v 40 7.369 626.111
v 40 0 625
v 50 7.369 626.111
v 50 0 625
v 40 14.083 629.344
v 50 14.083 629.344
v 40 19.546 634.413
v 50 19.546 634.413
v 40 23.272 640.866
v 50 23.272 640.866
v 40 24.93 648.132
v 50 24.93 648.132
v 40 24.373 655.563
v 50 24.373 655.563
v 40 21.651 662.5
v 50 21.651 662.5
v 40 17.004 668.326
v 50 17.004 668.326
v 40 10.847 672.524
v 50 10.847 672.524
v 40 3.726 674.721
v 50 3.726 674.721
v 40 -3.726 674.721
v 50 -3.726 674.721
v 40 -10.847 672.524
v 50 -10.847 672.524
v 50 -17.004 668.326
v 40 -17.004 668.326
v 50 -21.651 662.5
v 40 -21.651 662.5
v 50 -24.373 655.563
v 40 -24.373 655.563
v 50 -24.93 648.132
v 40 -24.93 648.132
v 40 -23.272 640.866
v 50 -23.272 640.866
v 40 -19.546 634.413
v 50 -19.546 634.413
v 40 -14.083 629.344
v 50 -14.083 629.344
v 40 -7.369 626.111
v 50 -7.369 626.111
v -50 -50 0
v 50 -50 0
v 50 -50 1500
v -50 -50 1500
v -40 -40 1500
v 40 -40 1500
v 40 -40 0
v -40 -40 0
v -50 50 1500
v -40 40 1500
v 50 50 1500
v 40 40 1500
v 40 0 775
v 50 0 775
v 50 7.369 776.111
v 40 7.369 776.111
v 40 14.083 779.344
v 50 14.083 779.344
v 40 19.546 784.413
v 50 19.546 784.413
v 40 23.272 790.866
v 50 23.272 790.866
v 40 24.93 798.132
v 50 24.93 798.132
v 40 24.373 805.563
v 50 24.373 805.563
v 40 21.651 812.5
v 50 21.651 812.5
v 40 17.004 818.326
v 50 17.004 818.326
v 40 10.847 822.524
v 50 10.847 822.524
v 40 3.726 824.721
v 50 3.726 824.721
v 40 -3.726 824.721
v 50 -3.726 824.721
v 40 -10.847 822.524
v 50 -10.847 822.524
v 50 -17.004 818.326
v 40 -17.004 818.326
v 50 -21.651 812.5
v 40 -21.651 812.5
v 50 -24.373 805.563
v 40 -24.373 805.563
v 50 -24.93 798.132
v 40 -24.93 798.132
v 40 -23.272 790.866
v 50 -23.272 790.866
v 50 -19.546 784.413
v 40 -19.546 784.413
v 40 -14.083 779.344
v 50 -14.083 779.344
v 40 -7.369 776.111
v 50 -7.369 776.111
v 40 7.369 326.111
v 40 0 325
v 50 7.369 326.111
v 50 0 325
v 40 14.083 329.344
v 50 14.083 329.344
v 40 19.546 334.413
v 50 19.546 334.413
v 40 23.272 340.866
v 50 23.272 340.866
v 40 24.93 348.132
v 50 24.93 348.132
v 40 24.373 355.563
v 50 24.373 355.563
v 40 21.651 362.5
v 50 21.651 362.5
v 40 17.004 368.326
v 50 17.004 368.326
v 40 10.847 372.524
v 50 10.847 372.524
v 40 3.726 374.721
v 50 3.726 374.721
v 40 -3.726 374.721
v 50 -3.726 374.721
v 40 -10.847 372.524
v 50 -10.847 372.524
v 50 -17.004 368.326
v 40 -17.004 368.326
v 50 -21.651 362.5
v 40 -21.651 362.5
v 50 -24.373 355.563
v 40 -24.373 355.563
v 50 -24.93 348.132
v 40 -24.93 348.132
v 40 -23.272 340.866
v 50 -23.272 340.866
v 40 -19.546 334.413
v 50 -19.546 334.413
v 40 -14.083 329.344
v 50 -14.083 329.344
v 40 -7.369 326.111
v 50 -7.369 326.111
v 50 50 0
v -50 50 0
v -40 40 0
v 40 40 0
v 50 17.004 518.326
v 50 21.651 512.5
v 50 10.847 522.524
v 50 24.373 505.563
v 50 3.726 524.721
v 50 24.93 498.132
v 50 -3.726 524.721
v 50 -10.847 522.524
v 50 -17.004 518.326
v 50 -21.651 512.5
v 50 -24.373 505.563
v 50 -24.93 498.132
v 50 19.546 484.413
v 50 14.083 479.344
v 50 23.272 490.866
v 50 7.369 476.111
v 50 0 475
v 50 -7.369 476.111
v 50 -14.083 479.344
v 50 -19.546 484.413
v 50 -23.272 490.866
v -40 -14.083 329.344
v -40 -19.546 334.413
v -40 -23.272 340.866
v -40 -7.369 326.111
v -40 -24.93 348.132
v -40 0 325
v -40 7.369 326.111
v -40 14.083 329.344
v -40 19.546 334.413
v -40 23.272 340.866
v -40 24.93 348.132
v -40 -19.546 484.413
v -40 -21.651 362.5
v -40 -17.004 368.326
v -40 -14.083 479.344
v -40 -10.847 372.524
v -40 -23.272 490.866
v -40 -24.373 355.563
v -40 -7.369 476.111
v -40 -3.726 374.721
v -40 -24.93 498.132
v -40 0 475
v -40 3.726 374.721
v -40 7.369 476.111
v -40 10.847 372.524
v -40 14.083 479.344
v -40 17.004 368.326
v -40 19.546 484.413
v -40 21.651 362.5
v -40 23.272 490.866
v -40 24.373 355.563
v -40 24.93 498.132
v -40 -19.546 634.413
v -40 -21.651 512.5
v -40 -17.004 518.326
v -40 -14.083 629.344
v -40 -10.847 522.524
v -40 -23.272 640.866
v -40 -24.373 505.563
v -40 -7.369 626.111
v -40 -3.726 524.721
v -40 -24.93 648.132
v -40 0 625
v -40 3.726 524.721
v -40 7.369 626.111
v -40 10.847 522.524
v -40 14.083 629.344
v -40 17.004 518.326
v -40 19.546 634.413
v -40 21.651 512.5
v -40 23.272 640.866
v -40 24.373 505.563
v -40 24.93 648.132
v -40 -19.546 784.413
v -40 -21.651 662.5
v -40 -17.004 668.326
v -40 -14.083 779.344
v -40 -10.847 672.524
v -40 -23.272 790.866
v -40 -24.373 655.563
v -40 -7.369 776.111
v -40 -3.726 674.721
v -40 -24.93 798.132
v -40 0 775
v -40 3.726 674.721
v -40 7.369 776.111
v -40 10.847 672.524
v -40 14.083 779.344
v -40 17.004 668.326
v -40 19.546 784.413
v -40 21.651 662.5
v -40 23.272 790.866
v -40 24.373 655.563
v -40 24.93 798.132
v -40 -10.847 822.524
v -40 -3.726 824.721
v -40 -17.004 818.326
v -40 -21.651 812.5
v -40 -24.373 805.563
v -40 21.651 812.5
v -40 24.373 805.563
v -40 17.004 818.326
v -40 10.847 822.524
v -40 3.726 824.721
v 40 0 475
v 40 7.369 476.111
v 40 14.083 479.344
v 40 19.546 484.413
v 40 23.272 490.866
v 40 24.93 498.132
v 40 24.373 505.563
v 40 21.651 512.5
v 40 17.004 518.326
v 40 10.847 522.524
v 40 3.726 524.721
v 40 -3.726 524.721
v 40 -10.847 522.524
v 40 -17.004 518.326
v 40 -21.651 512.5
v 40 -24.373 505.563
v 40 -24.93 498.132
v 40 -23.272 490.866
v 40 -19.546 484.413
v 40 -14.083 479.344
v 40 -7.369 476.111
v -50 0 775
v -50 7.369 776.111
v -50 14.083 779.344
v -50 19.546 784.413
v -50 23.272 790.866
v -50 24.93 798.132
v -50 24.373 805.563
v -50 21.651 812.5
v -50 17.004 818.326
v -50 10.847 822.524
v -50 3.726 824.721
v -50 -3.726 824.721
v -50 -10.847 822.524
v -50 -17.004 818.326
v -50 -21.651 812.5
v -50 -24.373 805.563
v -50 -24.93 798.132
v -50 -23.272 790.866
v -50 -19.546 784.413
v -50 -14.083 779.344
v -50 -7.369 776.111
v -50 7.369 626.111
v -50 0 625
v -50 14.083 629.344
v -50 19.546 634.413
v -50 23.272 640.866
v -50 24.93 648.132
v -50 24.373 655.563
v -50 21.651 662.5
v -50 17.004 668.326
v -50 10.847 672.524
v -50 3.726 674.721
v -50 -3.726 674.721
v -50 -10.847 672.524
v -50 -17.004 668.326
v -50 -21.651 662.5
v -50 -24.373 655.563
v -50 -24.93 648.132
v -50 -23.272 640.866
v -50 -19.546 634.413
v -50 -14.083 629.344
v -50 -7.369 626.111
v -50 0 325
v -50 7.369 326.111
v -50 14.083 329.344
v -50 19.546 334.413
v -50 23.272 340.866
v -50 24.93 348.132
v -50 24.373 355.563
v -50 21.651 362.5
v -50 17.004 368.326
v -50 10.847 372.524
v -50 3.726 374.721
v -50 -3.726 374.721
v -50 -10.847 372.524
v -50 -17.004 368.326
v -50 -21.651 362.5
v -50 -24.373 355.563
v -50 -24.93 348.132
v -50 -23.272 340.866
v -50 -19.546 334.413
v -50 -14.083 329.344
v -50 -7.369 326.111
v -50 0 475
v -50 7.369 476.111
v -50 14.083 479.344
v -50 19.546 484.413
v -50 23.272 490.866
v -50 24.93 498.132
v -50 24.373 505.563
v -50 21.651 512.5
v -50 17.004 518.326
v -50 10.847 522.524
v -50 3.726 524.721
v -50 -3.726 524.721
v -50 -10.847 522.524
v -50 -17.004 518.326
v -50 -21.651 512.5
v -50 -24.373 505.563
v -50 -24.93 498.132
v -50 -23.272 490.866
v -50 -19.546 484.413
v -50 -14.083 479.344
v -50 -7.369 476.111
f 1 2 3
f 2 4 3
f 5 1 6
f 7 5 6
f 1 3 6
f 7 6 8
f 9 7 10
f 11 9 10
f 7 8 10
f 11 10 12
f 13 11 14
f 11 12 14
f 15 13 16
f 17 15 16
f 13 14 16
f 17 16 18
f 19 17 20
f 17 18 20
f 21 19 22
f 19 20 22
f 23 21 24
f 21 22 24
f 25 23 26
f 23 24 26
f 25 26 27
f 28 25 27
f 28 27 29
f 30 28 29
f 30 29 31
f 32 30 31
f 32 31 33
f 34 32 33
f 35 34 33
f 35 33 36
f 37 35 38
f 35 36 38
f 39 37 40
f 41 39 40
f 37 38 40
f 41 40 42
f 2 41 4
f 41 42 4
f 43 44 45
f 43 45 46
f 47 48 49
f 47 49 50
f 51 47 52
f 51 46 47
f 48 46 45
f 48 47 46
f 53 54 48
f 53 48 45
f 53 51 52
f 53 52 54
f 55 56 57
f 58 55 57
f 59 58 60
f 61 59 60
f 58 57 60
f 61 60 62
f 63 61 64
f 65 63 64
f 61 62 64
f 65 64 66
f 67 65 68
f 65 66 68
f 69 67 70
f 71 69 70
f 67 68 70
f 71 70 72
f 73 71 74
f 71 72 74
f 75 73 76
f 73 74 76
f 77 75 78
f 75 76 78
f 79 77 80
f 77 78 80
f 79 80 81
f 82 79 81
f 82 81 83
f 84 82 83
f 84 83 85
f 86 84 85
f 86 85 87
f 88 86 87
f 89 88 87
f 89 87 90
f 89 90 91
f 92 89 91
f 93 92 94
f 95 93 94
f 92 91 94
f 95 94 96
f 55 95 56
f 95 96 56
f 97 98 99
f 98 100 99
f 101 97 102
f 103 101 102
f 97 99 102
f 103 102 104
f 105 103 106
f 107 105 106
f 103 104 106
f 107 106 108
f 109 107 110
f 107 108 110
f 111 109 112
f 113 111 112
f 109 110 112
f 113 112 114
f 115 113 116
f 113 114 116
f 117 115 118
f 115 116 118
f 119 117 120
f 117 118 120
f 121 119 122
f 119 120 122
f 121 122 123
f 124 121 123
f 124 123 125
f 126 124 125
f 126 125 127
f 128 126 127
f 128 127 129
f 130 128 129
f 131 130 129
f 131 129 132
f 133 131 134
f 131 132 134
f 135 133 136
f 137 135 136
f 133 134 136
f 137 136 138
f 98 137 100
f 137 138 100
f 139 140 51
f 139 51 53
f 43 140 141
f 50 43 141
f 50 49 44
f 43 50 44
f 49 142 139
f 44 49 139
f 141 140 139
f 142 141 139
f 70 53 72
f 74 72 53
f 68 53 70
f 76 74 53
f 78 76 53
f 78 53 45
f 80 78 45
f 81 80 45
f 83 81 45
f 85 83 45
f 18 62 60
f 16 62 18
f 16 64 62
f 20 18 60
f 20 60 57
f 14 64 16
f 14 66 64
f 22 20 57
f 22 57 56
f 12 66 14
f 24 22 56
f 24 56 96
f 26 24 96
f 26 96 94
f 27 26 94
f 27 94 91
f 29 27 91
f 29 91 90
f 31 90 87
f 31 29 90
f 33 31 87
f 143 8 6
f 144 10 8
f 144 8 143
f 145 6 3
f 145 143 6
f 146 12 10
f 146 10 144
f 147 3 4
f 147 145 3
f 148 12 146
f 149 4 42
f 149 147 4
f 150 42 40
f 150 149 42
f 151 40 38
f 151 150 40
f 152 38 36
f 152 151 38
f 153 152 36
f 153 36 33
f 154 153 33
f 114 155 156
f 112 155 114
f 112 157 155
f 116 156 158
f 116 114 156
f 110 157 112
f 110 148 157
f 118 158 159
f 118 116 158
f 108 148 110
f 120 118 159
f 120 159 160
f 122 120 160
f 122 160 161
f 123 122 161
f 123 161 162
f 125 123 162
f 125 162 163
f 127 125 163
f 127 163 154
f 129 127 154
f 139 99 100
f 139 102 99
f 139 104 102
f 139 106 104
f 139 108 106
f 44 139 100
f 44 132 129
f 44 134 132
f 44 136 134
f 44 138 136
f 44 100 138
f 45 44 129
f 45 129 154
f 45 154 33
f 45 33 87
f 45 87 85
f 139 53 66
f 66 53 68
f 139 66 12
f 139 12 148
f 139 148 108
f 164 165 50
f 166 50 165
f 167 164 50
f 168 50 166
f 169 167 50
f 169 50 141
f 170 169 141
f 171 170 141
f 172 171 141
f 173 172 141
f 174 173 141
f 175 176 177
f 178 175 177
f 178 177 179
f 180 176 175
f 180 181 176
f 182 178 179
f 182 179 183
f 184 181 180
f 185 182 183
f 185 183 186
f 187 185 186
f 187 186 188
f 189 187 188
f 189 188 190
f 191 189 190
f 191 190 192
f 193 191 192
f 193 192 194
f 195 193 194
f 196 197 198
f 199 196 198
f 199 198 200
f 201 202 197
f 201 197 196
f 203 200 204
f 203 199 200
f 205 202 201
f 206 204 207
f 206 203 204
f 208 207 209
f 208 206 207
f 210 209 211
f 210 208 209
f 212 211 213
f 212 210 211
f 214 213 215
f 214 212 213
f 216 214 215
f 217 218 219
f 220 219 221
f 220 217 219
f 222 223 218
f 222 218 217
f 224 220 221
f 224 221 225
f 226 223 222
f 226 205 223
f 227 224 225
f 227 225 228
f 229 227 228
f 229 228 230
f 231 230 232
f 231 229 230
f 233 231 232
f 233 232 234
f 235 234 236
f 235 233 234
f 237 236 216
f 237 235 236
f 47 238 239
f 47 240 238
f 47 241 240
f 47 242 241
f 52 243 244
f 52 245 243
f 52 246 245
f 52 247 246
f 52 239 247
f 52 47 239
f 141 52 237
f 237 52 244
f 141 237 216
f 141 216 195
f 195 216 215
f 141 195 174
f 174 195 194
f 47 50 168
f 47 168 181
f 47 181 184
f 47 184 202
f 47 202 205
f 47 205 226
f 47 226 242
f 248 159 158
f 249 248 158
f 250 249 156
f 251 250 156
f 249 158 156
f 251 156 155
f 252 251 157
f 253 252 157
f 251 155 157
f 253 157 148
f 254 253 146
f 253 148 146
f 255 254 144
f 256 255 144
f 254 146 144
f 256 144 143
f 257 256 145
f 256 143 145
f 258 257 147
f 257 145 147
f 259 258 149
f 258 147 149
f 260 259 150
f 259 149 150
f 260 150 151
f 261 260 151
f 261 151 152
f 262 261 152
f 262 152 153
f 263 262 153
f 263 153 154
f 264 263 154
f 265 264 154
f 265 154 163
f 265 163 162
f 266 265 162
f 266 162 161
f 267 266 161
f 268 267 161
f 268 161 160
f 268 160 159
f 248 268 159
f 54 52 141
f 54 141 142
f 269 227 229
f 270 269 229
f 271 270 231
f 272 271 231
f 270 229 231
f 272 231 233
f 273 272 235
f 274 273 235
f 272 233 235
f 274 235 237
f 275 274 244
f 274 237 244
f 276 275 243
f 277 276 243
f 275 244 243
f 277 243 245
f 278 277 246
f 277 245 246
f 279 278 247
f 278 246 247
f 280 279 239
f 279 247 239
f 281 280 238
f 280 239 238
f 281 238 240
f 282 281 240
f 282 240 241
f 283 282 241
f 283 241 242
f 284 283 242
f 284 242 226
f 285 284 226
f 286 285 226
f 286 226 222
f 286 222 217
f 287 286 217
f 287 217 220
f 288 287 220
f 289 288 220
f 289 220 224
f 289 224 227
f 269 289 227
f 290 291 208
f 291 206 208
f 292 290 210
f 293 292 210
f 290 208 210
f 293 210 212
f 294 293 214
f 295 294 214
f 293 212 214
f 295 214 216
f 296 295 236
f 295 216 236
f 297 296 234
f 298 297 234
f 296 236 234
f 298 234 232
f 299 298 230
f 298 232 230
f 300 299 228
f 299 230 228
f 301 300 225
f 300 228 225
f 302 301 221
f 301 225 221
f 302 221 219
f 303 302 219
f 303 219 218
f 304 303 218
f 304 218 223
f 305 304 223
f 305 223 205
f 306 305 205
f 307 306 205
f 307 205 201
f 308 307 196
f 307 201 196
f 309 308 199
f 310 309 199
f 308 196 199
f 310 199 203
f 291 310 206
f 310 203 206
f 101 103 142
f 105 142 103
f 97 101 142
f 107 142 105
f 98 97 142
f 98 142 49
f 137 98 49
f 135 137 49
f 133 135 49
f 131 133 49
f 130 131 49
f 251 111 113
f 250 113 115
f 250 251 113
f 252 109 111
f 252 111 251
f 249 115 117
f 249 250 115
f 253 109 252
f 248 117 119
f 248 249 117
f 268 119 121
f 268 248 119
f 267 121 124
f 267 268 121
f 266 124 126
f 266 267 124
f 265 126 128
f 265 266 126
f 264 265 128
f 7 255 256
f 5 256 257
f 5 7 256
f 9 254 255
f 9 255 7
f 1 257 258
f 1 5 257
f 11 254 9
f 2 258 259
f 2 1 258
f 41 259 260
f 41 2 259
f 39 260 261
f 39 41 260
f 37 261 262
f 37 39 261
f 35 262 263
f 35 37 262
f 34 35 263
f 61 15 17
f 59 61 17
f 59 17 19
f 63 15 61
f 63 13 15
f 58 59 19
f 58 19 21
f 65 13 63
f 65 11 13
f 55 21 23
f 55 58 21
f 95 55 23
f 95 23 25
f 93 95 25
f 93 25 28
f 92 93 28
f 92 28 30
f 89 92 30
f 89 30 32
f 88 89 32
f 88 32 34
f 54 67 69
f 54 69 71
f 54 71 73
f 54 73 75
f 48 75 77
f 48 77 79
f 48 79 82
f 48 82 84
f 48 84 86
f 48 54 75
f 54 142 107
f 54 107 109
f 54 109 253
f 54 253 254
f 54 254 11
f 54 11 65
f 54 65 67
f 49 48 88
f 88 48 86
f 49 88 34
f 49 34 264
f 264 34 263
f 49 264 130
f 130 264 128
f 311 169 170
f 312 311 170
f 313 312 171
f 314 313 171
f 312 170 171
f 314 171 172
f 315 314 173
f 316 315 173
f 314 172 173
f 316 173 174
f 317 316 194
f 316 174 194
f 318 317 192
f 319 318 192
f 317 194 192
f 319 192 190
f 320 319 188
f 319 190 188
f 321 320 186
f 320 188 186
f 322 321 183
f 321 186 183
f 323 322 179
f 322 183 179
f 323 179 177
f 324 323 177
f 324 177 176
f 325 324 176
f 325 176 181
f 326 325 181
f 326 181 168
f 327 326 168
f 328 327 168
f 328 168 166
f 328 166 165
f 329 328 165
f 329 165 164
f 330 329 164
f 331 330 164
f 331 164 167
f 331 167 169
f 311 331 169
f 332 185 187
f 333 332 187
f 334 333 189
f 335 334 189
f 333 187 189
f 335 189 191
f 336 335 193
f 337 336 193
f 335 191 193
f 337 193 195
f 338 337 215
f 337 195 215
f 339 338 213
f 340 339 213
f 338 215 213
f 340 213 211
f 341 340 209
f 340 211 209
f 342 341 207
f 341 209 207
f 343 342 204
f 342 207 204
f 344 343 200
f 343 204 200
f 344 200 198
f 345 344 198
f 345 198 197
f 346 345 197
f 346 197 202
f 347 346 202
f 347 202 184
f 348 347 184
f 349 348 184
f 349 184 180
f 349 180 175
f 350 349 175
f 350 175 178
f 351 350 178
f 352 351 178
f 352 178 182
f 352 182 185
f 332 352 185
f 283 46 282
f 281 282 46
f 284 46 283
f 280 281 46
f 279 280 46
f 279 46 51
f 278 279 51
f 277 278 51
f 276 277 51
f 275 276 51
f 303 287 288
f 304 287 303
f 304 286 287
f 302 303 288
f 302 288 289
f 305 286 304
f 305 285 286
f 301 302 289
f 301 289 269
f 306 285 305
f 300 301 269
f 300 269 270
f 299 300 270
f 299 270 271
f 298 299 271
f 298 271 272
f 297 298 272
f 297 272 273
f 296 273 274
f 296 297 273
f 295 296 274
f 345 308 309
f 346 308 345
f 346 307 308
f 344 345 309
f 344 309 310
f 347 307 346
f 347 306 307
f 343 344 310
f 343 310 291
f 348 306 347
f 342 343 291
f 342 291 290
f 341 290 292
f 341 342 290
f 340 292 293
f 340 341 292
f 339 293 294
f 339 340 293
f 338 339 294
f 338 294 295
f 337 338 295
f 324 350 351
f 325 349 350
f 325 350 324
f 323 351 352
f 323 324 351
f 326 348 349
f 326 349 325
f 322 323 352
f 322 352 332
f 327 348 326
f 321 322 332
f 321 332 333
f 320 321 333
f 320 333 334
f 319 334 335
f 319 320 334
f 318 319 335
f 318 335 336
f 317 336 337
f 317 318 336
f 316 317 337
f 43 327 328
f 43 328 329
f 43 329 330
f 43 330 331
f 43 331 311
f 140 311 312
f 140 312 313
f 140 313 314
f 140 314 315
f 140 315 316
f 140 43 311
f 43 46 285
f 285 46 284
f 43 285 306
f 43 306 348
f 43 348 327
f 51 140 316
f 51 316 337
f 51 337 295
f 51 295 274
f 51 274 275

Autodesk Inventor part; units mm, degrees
ref_plane "YZ Plane" through (0, 0, 0) normal (1, 0, 0) x (0, 1, 0)
ref_plane "XZ Plane" through (0, 0, 0) normal (0, 1, 0) x (-1, 0, 0)
ref_plane "XY Plane" through (0, 0, 0) normal (0, 0, 1) x (1, 0, 0)
sketch "Sketch1" plane through (0, 0, 0) normal (0, 0, 1) x (1, 0, 0)
  line L0 (-50, 50) -> (50, 50)
  line L1 (50, 50) -> (50, -50)
  line L2 (50, -50) -> (-50, -50)
  line L3 (-50, -50) -> (-50, 50)
  line L4 (-50, 50) -> (50, -50) construction
  line L5 (50, 50) -> (-50, -50) construction
  point P0 (0, 0)
  dimension "d0" = 100
  dimension "d1" = 100
extrude "Extrusion1" add sketch "Sketch1" along normal blind 1500
sketch "Sketch2" plane through (0, 0, 1500) normal (0, 0, 1) x (1, 0, 0)
  line L0 (-40, 40) -> (40, 40)
  line L1 (40, 40) -> (40, -40)
  line L2 (40, -40) -> (-40, -40)
  line L3 (-40, -40) -> (-40, 40)
  line L4 (-40, 40) -> (40, -40) construction
  line L5 (40, 40) -> (-40, -40) construction
  point P0 (0, 0)
  dimension "d4" = 80
  dimension "d5" = 80
extrude "Extrusion2" cut sketch "Sketch2" against normal blind 1500
sketch "Sketch3" plane through (50, -50, 0) normal (1, 0, 0) x (0, 0, -1)
  line L0 (0, 100) -> (0, 0) projected
  circle A0 centre (-350, 50) radius 25
  circle A1 centre (-500, 50) radius 25
  circle A2 centre (-650, 50) radius 25
  circle A3 centre (-800, 50) radius 25
  point P0 (0, 50)
  dimension "d8" = 50
  dimension "d9" = 50
  dimension "d10" = 50
  dimension "d11" = 50
  dimension "d12" = 350
  dimension "d13" = 150
  dimension "d14" = 150
  dimension "d15" = 150
extrude "Extrusion3" cut sketch "Sketch3" against normal blind 1000
properties part number "atas 2"
